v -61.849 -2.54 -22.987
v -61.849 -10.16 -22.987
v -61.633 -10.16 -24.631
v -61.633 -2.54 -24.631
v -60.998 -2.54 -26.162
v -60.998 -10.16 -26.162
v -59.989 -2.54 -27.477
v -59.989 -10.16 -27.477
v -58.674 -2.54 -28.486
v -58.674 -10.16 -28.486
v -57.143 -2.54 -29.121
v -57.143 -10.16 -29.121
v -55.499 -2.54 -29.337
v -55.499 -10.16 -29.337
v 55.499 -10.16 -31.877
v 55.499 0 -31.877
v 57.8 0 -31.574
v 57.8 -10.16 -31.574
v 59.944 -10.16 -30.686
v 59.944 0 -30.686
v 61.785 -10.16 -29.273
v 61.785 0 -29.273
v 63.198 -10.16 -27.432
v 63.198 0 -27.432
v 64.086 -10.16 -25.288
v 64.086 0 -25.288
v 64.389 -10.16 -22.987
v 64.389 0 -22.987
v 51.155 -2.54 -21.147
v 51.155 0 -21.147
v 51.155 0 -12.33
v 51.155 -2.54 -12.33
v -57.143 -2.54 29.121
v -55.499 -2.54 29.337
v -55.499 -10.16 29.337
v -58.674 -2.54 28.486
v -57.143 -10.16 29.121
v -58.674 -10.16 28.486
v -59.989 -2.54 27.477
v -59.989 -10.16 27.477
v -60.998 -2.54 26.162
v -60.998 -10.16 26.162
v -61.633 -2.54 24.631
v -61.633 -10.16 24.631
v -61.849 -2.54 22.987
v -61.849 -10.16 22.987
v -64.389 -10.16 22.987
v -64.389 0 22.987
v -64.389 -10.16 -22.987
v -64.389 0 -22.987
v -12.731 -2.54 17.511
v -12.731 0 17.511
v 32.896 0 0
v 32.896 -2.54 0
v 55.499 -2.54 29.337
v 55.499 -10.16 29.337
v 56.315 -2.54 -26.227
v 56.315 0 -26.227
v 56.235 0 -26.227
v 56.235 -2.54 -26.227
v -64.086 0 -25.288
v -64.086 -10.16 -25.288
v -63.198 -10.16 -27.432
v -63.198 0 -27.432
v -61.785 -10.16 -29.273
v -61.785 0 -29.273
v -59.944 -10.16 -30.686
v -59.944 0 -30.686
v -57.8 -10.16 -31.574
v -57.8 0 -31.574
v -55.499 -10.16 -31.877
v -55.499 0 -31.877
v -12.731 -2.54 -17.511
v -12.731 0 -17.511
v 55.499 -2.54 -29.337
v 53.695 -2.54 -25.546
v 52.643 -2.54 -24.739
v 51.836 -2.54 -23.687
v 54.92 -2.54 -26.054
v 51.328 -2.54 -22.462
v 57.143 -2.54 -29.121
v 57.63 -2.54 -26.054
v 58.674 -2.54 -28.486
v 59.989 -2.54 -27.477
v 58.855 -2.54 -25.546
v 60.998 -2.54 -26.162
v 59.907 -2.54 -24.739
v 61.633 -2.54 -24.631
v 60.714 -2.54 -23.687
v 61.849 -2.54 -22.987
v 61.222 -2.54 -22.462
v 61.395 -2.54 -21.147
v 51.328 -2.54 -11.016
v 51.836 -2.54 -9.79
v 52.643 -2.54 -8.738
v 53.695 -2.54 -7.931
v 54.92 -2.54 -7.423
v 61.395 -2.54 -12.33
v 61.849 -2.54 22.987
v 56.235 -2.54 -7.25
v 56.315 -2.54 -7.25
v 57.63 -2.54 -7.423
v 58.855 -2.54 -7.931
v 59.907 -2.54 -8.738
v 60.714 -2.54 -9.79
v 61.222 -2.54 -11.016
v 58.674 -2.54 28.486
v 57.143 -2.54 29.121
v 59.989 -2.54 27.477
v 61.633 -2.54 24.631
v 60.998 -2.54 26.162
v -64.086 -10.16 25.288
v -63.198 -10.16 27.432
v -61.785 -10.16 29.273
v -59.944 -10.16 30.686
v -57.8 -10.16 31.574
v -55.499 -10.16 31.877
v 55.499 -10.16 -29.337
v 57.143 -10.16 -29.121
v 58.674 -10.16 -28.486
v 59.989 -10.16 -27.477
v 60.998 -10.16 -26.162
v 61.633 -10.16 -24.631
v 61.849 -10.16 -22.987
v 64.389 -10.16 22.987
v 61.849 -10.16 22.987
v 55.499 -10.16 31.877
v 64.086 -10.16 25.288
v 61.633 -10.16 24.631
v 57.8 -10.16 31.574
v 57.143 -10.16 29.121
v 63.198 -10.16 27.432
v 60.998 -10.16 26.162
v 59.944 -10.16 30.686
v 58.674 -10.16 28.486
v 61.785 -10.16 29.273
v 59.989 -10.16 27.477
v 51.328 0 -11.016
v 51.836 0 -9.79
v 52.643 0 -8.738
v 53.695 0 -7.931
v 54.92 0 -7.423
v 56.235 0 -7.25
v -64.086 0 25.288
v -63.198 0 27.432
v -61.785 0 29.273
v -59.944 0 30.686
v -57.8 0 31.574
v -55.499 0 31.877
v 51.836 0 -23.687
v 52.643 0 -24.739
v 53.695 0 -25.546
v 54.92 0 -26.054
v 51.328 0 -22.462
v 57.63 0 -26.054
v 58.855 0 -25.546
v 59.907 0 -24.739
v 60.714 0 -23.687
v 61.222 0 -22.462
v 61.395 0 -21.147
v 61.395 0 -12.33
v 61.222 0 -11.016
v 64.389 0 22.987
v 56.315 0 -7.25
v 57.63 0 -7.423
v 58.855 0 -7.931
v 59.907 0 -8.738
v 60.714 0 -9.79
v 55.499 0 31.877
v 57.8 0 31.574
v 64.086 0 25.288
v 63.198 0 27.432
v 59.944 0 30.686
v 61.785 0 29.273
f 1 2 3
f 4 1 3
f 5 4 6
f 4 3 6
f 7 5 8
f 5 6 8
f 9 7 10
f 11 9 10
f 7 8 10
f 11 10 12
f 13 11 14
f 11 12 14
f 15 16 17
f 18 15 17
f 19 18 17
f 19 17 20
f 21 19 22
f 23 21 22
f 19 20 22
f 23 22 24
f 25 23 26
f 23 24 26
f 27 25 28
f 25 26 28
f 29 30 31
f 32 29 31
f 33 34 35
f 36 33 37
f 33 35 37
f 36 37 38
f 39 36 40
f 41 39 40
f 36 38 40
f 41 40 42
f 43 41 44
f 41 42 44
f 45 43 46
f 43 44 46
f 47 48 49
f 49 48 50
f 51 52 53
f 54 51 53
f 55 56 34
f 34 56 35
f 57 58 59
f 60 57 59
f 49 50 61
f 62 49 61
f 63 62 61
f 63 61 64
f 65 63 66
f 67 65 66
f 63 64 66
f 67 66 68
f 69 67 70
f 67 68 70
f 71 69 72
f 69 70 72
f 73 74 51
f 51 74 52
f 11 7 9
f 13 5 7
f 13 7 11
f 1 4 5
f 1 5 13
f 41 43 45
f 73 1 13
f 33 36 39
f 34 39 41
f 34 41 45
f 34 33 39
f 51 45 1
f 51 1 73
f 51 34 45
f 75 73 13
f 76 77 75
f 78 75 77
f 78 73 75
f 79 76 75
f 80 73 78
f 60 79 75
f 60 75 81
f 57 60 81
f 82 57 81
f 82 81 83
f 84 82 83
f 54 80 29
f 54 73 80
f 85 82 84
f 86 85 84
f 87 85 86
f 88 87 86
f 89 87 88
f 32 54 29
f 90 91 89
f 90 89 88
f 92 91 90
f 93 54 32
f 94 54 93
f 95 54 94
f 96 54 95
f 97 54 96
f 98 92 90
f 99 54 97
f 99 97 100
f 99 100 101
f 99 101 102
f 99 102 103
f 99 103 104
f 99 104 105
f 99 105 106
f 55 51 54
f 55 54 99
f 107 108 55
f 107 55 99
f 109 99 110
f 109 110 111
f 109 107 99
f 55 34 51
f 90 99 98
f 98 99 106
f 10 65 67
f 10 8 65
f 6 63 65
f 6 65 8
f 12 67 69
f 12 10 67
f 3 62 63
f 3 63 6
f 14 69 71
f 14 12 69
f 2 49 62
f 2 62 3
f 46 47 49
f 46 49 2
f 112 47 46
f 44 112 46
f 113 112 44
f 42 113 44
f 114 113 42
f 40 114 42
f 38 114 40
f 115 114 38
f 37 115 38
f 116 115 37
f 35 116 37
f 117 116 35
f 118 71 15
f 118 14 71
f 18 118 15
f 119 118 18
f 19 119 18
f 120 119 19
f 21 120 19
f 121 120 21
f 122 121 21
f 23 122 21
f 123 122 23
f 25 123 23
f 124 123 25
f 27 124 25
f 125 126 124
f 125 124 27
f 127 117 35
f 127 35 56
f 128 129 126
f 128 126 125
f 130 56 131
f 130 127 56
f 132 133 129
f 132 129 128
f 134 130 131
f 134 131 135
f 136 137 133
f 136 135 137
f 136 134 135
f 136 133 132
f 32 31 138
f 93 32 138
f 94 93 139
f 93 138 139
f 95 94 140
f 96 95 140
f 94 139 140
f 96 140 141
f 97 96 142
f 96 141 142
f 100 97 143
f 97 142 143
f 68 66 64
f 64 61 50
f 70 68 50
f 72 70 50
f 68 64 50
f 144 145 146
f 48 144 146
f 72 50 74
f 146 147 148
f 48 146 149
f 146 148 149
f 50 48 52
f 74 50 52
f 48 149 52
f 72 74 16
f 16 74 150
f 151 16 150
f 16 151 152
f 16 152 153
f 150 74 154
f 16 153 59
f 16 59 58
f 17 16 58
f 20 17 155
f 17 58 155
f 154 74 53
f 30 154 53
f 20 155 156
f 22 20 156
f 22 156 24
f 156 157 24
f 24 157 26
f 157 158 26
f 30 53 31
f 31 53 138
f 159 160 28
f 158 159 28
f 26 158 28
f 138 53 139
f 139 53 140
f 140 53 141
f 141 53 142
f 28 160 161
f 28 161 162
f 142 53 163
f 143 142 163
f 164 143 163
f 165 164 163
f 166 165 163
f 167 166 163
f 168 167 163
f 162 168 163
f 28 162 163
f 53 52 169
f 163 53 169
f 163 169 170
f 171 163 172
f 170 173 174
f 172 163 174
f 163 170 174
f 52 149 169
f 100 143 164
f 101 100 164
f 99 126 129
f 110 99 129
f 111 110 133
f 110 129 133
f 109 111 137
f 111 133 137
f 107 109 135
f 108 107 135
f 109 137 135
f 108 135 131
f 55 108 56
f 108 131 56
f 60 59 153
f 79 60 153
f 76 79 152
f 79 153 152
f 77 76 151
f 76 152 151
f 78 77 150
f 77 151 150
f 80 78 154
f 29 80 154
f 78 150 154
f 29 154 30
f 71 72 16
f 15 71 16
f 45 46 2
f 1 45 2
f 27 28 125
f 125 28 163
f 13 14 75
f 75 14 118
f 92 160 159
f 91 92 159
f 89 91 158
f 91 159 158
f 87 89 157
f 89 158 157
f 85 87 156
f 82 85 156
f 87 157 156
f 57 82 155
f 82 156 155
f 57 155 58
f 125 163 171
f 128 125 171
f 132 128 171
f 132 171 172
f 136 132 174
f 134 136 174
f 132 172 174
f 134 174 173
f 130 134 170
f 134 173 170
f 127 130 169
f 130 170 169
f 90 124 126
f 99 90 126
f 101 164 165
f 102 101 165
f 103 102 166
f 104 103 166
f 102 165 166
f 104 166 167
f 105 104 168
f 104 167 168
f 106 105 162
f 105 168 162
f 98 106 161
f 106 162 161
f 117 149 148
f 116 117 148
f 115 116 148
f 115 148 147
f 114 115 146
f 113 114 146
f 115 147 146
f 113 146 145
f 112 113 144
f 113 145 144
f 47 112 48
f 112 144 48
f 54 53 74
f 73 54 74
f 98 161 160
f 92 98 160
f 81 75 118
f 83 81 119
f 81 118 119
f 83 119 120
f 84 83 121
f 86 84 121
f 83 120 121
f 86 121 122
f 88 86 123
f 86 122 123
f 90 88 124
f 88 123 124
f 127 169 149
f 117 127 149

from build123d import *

# Parameters (mm, degrees)
F1_DEPTH      = 10.16
F3_DEPTH      = 7.62
F5_DEPTH      = 25.4
F7_DEPTH      = 25.4
F7_DEPTH_BACK = 25.4


with BuildPart() as f1:
    # F0 (on Front) → F1 (new body)
    with BuildSketch(Plane.XZ):
        with BuildLine():
            Line((55.499, 31.877), (-55.499, 31.877))
            ThreePointArc((-55.499, 31.877), (-61.785179, 29.273179), (-64.389, 22.987))
            Line((-64.389, 22.987), (-64.389, -22.987))
            ThreePointArc((-64.389, -22.987), (-61.785179, -29.273179), (-55.499, -31.877))
            Line((-55.499, -31.877), (55.499, -31.877))
            ThreePointArc((55.499, -31.877), (61.785179, -29.273179), (64.389, -22.987))
            Line((64.389, -22.987), (64.389, 22.987))
            ThreePointArc((64.389, 22.987), (61.785179, 29.273179), (55.499, 31.877))
        make_face()
    extrude(amount=F1_DEPTH)

    # F2 (on face) → F3 (cut)
    with BuildSketch(Plane.XZ.offset(10.16)):
        with BuildLine():
            Line((55.499, 29.337), (-55.499, 29.337))
            ThreePointArc((-55.499, 29.337), (-59.989128, 27.477128), (-61.849, 22.987))
            Line((-61.849, 22.987), (-61.849, -22.987))
            ThreePointArc((-61.849, -22.987), (-59.989128, -27.477128), (-55.499, -29.337))
            Line((-55.499, -29.337), (55.499, -29.337))
            ThreePointArc((55.499, -29.337), (59.989128, -27.477128), (61.849, -22.987))
            Line((61.849, -22.987), (61.849, 22.987))
            ThreePointArc((61.849, 22.987), (59.989128, 27.477128), (55.499, 29.337))
        make_face()
    extrude(amount=-F3_DEPTH, mode=Mode.SUBTRACT)

    # F4 (on face) → F5 (cut)
    with BuildSketch(Plane(origin=(0, 0, 0), x_dir=(-1, 0, 0), z_dir=(0, 1, 0))):
        with BuildLine():
            ThreePointArc((-61.394893, -21.146874), (-59.906995, -24.738976), (-56.314893, -26.226874))
            Line((-56.314893, -26.226874), (-56.235034, -26.226874))
            ThreePointArc((-56.235034, -26.226874), (-52.642932, -24.738976), (-51.155034, -21.146874))
            Line((-51.155034, -21.146874), (-51.155034, -12.330383))
            ThreePointArc((-51.155034, -12.330383), (-52.642932, -8.738281), (-56.235034, -7.250383))
            Line((-56.235034, -7.250383), (-56.314893, -7.250383))
            ThreePointArc((-56.314893, -7.250383), (-59.906995, -8.738281), (-61.394893, -12.330383))
            Line((-61.394893, -12.330383), (-61.394893, -21.146874))
        make_face()
    extrude(amount=-F5_DEPTH, mode=Mode.SUBTRACT)

    # F6 (on face) → F7 (cut, two sides)
    with BuildSketch(Plane(origin=(0, 0, 0), x_dir=(-1, 0, 0), z_dir=(0, 1, 0))) as f7_sk:
        Polygon((12.73114, 17.510513), (-32.89561, 0), (12.73114, -17.510513), align=None)
    extrude(amount=F7_DEPTH, mode=Mode.SUBTRACT)
    extrude(f7_sk.sketch, amount=-F7_DEPTH_BACK, mode=Mode.SUBTRACT)


solid = f1.part
